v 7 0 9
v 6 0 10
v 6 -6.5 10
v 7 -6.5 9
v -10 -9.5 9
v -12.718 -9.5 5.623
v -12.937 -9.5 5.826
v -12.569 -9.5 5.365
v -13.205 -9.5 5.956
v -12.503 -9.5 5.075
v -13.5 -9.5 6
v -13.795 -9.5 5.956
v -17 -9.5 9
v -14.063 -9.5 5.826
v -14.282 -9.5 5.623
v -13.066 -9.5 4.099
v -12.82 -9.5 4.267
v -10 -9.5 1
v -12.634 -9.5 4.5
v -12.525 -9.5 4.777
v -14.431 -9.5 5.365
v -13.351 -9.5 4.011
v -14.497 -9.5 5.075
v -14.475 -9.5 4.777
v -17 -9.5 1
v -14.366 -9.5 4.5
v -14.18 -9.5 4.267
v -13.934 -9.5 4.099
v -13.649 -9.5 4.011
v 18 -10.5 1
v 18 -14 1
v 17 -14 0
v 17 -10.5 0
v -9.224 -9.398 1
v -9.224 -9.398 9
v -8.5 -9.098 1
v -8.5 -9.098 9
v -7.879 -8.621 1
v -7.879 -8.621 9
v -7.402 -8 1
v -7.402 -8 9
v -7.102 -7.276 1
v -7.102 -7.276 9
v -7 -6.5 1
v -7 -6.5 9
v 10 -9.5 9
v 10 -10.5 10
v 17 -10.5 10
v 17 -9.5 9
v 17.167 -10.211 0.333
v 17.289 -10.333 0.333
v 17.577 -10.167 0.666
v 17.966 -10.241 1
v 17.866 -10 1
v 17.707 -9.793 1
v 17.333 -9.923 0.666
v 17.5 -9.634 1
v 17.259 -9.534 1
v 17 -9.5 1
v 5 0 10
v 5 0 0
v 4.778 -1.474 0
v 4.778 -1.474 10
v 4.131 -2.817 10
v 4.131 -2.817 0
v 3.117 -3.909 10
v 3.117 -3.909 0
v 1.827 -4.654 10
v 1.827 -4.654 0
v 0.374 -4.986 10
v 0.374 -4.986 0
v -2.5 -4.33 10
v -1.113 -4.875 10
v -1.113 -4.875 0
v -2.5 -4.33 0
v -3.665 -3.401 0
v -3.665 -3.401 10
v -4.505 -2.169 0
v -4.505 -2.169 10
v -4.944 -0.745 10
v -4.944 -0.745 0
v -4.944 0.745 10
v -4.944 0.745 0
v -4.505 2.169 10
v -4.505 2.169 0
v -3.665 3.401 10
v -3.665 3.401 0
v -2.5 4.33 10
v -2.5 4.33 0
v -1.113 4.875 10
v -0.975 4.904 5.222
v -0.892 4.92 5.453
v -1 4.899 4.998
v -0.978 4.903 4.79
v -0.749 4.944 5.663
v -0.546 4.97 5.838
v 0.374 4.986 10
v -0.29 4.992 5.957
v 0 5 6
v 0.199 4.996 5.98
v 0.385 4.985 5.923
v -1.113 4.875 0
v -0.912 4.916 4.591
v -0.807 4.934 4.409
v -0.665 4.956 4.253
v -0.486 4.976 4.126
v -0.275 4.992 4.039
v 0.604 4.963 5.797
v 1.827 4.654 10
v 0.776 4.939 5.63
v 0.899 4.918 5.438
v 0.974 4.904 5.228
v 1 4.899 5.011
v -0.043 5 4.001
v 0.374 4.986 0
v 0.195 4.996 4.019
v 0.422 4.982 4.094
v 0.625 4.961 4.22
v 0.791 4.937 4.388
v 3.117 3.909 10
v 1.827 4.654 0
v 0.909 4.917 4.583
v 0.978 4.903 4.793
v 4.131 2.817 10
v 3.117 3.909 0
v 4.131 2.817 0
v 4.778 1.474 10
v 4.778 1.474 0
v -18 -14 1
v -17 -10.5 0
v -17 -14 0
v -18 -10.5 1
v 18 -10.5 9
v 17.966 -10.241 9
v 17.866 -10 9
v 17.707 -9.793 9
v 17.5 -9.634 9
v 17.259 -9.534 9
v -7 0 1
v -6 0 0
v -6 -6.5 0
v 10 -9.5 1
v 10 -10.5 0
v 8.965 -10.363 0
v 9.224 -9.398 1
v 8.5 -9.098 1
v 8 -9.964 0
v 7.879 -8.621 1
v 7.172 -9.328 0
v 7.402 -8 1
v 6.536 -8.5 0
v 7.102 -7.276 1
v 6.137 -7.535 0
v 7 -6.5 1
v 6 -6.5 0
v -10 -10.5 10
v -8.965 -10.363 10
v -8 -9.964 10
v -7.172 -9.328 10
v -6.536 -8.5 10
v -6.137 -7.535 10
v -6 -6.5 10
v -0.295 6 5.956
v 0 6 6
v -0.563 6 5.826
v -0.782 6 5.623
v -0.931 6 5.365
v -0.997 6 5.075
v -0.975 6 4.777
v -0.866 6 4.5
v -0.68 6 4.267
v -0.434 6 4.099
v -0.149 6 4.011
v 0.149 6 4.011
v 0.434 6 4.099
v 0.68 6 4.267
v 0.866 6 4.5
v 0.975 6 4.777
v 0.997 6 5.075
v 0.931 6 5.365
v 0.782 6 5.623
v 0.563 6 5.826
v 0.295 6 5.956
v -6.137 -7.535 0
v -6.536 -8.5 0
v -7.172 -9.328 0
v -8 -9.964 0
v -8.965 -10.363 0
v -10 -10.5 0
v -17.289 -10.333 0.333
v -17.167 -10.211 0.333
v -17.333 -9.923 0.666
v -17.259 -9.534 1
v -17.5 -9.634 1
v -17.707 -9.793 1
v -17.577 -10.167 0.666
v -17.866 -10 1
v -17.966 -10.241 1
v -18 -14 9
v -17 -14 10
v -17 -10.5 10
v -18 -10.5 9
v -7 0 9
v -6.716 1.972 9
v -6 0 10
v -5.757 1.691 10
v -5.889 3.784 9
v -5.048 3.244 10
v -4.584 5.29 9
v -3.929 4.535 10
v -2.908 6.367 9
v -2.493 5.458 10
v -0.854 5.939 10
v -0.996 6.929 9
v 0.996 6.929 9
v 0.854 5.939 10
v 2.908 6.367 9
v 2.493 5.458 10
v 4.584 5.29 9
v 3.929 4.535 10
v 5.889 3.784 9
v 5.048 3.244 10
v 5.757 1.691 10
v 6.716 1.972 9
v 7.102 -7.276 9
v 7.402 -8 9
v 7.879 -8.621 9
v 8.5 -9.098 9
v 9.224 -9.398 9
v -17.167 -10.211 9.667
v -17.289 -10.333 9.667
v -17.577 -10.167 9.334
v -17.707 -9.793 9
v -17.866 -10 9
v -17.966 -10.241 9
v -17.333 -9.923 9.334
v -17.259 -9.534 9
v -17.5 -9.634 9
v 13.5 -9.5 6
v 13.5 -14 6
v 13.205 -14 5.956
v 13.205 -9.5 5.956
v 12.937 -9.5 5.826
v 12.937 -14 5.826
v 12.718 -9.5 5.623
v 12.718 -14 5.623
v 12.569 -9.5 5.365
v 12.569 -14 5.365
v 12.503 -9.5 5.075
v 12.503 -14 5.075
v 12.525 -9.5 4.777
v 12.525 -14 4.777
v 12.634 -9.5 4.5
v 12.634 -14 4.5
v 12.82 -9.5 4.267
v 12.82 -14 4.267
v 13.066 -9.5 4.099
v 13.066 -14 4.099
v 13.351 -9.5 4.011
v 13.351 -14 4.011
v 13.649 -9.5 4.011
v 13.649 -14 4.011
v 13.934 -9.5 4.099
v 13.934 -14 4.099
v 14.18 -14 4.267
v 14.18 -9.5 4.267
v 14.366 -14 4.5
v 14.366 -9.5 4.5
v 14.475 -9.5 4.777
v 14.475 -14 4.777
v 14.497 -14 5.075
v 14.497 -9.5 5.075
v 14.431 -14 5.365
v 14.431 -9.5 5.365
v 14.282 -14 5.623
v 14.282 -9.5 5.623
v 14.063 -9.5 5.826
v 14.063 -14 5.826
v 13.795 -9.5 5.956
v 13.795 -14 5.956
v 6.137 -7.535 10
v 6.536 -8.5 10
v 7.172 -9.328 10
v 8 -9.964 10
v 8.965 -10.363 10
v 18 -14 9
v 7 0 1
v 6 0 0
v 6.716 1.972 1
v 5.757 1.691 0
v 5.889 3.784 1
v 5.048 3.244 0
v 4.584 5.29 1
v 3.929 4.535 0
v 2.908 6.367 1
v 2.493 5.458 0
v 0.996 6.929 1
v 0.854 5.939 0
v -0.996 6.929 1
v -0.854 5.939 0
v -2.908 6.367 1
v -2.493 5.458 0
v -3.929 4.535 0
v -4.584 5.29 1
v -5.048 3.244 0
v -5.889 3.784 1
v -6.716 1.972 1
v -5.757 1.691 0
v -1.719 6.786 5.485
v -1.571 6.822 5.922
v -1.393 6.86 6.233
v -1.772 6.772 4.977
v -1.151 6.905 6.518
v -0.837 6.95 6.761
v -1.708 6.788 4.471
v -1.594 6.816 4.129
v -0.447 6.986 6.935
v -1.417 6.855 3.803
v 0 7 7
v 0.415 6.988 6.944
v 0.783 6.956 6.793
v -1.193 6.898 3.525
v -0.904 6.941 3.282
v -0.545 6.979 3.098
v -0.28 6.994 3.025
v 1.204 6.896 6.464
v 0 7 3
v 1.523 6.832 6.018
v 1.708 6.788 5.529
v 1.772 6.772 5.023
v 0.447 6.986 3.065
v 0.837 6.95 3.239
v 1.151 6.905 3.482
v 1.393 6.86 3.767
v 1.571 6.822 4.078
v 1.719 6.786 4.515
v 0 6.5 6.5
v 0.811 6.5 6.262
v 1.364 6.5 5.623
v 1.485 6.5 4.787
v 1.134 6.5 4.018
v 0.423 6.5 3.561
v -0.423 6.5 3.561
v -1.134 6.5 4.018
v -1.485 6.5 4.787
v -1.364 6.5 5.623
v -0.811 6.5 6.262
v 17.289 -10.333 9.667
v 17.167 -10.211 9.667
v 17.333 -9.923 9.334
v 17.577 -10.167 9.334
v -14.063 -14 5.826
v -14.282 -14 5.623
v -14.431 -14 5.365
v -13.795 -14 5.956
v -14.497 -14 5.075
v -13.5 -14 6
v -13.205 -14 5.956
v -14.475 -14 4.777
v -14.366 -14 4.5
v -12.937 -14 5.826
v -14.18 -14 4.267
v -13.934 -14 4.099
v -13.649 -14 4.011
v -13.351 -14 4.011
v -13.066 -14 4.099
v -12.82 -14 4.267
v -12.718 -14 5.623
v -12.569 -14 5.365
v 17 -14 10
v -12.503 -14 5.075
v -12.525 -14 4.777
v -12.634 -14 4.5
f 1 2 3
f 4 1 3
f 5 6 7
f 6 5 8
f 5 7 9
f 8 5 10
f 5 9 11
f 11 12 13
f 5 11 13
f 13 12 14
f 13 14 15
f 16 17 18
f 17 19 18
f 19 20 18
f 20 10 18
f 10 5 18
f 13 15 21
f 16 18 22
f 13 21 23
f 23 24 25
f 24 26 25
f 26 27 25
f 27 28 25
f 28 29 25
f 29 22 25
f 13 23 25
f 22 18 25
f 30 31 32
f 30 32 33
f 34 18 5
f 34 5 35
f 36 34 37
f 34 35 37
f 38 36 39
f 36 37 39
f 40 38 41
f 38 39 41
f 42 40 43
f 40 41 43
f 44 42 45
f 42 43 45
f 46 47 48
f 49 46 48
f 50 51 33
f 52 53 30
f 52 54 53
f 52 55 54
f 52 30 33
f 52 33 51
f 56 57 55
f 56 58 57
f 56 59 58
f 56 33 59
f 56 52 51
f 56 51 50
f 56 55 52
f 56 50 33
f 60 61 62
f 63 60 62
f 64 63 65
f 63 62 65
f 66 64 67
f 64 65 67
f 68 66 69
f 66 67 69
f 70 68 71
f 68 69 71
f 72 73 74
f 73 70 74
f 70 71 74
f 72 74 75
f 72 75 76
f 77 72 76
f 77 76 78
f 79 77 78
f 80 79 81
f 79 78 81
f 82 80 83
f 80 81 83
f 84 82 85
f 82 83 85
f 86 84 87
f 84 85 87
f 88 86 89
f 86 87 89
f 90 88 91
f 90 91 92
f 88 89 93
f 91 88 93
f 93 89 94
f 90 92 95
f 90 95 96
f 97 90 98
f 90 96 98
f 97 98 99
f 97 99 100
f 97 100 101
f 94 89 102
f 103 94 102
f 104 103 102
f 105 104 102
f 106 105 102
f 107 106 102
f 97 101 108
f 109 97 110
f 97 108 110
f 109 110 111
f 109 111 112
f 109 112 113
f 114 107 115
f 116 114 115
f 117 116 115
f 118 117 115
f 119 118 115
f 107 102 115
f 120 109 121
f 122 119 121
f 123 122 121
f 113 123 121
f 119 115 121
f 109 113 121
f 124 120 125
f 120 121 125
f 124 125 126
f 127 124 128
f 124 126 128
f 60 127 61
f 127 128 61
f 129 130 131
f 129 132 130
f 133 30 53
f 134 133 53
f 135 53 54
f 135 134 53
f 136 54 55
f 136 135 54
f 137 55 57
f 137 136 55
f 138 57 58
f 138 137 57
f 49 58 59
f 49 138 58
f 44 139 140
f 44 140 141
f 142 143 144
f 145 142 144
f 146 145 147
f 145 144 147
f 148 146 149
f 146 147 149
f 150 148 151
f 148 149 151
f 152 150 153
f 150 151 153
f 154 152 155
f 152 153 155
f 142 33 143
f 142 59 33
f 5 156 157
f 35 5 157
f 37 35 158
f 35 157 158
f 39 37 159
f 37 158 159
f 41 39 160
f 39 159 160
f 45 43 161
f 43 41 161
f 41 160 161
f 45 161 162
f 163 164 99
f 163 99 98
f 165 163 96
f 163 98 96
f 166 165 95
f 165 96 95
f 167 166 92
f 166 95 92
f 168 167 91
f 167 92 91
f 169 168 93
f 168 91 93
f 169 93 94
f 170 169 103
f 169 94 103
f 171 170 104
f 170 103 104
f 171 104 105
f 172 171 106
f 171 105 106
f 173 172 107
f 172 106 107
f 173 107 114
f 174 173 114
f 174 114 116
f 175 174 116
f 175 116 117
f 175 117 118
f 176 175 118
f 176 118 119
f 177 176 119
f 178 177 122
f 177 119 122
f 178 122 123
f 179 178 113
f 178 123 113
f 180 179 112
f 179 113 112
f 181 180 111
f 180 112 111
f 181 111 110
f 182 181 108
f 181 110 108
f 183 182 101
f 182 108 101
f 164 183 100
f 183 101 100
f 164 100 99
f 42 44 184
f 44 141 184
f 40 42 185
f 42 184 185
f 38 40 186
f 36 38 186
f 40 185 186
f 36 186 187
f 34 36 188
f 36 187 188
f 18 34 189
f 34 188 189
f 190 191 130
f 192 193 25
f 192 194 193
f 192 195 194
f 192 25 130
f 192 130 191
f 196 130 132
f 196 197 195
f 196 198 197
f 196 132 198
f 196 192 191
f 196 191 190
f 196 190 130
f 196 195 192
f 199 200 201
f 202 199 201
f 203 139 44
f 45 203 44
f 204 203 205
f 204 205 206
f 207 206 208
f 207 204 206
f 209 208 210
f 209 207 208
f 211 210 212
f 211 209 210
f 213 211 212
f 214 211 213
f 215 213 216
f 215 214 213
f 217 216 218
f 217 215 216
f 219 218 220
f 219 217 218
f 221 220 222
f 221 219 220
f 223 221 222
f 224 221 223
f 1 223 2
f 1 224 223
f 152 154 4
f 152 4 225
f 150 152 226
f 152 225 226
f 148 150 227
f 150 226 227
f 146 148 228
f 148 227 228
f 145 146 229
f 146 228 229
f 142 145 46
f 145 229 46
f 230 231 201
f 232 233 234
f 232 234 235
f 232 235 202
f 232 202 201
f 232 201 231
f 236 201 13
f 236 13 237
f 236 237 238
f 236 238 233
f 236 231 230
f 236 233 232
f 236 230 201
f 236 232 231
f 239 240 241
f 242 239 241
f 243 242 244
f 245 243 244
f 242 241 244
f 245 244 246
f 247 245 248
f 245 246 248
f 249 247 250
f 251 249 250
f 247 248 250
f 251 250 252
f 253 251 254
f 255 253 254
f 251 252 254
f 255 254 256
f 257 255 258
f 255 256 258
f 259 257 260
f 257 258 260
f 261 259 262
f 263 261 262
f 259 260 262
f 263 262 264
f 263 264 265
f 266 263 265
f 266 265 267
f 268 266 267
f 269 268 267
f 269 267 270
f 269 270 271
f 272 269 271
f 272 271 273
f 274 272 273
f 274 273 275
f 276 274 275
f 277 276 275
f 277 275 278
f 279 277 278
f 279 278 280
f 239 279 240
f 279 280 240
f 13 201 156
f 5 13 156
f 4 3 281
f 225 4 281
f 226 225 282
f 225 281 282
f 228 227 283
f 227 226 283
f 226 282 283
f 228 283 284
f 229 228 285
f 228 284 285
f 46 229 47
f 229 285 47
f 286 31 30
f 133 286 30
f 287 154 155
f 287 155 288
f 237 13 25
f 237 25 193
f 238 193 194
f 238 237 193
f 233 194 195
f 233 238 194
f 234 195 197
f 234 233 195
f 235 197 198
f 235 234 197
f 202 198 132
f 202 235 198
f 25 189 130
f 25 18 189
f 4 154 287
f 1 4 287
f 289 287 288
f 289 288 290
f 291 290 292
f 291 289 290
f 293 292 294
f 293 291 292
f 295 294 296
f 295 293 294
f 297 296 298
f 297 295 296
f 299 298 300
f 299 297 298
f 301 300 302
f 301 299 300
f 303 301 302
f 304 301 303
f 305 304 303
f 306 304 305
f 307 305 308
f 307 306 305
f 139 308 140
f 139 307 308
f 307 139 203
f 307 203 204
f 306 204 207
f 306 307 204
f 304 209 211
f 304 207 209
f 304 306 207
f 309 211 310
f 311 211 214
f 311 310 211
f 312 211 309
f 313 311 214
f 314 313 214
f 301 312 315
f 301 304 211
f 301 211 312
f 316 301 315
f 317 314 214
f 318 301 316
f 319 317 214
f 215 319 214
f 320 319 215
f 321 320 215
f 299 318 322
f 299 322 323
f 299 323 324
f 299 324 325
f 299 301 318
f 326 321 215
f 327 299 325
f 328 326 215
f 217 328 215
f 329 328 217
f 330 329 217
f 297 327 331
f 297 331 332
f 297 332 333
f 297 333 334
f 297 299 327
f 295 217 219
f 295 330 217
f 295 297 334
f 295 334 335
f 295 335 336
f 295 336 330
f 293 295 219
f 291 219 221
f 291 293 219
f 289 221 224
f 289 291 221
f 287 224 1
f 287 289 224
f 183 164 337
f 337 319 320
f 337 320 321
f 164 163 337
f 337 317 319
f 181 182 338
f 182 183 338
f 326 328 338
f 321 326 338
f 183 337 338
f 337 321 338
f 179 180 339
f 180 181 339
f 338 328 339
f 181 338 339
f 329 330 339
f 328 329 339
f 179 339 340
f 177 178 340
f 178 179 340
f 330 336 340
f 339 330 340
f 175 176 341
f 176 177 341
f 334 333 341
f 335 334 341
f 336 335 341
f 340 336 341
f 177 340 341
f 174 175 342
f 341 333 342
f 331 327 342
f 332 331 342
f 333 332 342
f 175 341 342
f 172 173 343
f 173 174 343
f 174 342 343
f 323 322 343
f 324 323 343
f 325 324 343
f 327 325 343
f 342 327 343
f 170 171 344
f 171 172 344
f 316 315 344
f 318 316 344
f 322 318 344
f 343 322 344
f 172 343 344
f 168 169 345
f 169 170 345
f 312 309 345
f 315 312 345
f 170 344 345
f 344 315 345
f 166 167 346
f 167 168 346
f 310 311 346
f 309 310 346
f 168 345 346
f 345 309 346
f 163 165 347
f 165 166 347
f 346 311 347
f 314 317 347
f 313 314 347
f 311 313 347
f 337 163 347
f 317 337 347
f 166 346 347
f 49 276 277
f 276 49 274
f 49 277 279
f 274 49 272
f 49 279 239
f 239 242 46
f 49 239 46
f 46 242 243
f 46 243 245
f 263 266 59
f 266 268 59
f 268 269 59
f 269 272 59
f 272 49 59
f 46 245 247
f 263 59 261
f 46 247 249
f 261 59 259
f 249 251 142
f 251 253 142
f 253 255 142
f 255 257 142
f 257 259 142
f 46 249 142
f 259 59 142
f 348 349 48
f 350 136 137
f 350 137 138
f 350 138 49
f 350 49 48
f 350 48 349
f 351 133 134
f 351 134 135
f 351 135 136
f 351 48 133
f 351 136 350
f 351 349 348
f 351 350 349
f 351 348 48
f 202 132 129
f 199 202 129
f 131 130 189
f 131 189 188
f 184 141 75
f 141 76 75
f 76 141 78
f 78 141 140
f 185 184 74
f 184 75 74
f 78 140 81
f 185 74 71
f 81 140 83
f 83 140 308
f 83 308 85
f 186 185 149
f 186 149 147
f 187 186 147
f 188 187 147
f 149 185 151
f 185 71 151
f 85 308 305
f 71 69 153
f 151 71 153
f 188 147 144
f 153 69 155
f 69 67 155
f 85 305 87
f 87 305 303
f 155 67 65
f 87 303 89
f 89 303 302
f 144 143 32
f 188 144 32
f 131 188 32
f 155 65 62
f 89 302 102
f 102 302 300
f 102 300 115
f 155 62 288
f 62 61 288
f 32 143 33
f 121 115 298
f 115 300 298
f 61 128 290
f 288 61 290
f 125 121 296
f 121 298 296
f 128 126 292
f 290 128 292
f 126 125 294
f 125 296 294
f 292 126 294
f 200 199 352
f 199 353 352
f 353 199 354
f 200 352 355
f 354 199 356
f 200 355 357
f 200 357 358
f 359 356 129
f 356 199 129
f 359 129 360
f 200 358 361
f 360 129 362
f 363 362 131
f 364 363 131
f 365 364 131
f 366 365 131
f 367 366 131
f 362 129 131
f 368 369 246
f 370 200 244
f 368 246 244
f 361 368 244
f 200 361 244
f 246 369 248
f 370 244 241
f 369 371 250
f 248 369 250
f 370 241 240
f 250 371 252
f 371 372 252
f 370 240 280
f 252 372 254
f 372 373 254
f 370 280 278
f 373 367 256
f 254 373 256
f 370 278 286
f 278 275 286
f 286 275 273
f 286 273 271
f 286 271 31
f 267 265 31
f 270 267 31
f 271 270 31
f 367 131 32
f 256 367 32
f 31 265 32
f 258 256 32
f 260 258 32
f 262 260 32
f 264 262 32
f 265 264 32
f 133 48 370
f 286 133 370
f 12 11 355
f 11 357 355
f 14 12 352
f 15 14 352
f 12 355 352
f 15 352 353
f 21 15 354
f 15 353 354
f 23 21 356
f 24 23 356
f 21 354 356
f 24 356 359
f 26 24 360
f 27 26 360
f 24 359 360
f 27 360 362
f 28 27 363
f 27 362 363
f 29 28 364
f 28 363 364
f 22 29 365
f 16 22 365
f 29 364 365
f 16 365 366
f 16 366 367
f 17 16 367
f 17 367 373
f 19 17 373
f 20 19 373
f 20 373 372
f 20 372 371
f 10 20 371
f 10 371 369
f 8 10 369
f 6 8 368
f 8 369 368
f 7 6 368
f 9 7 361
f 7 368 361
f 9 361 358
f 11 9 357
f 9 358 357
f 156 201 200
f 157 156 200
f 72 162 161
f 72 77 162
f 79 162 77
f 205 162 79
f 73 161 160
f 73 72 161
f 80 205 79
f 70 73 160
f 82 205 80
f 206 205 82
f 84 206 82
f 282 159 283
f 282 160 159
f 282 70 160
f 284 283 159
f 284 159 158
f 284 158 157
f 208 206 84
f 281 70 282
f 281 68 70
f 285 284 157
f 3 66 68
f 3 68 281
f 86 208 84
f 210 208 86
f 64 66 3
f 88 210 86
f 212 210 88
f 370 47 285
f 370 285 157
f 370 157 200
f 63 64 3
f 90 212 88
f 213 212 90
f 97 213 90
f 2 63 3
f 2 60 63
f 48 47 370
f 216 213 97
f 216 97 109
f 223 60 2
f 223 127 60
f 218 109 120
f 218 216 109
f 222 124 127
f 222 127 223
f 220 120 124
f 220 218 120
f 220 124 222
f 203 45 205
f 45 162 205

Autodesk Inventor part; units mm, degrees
ref_plane "YZ Plane" through (0, 0, 0) normal (1, 0, 0) x (0, 1, 0)
ref_plane "XY Plane" through (0, 0, 0) normal (0, 0, 1) x (1, 0, 0)
sketch "Sketch1" plane through (0, 0, 0) normal (0, 0, 1) x (1, 0, 0)
  circle A0 centre (0, 0) radius 5
  circle A1 centre (0, 0) radius 7
  line L0 (-18, -9.5) -> (-10, -9.5)
  line L1 (18, -9.5) -> (10, -9.5)
  line L2 (0, -14) -> (18, -14)
  line L3 (0, -14) -> (-18, -14)
  line L4 (-7, 0) -> (-7, -9.5)
  line L5 (-7, -9.5) -> (-18, -9.5)
  line L6 (-18, -9.5) -> (-18, -14)
  line L7 (-18, -14) -> (18, -14)
  line L8 (18, -14) -> (18, -9.5)
  line L9 (18, -9.5) -> (7, -9.5)
  line L10 (7, -9.5) -> (7, 0)
  point P0 (-10.8595, -8.0551)
  dimension "d0" = 14
  dimension "d1" = 10
  dimension "d2" = 4.5
  dimension "d3" = 0
  dimension "d4" = 11
  dimension "d5" = 36
  dimension "d6" = 9.5
  dimension "d7" = 8
  dimension "d8" = 18
  dimension "d9" = 28
  dimension "d10" = 1.4449
  dimension "d11" = 28.8595
extrude "Extrusion1" add sketch "Sketch1" along normal blind 10
fillet "Fillet1" radius 1 2 edges at (18, -9.5, 5) (-18, -9.5, 5)
fillet "Fillet2" radius 3 2 edges at (7, -9.5, 5) (-7, -9.5, 5)
chamfer "Chamfer1" distance 1 angle 45 22 edges at (0, 7, 10) (-7, -3.2502, 10) (-9.9998, -9.5, 10) (-13.5, -9.5, 10) (-17.7071, -9.7929, 10) (-18, -12.25, 10) (7, -3.2503, 10) (9.9997, -9.5, 10) (13.5, -9.5, 10) (17.7071, -9.7929, 10) (18, -12.25, 10) (0, 7, 0) (-7, -3.2502, 0) (-9.9998, -9.5, 0) (-13.5, -9.5, 0) (-17.7071, -9.7929, 0) (-18, -12.25, 0) (7, -3.2503, 0) (9.9997, -9.5, 0) (13.5, -9.5, 0) (17.7071, -9.7929, 0) (18, -12.25, 0)
sketch "Sketch2" plane through (10, -9.5, 1) normal (0, 1, 0) x (1, 0, 0)
  line L0 (-27, 0) -> (-20, 0) projected
  line L1 (-27, -8) -> (-27, 0) projected
  line L2 (-20, -8) -> (-27, -8) projected
  line L3 (-20, 0) -> (-20, -8) projected
  line L4 (0, 0) -> (7, 0) projected
  line L5 (0, -8) -> (0, 0) projected
  line L6 (7, -8) -> (0, -8) projected
  line L7 (7, 0) -> (7, -8) projected
  line L8 (-27, -8) -> (-20, -8)
  line L9 (-20, -8) -> (-20, 0)
  line L10 (-20, 0) -> (-27, 0)
  line L11 (-27, 0) -> (-27, -8)
  line L12 (-27, -8) -> (-20, 0) construction
  line L13 (-20, -8) -> (-27, 0) construction
  line L14 (0, -8) -> (7, -8)
  line L15 (7, -8) -> (7, 0)
  line L16 (7, 0) -> (0, 0)
  line L17 (0, 0) -> (0, -8)
  line L18 (0, -8) -> (7, 0) construction
  line L19 (7, -8) -> (0, 0) construction
  point P0 (-10, 1)
  point P1 (-23.5, -4)
  point P2 (3.5, -4)
  point P3 (-23.5, -4)
  point P4 (3.5, -4)
hole "Hole1" at (-13.5, -9.5, 5) at (13.5, -9.5, 5) direction (0, -1, 0) diameter 2 end through all
ref_plane "Work Plane1" through (0, 7, 0) normal (0, 1, 0) x (-1, 0, 0)
sketch "Sketch3" plane through (0, 7, 0) normal (0, 1, 0) x (-1, 0, 0)
  line L0 (7, 1) -> (-7, 1) projected
  line L1 (7, 1) -> (7, 9) projected
  line L2 (-7, 9) -> (7, 9) projected
  line L3 (-7, 1) -> (-7, 9) projected
  line L4 (7, 9) -> (-7, 9)
  line L5 (-7, 9) -> (-7, 1)
  line L6 (-7, 1) -> (7, 1)
  line L7 (7, 1) -> (7, 9)
  line L8 (7, 9) -> (-7, 1) construction
  line L9 (-7, 9) -> (7, 1) construction
  point P0 (0, 0)
  point P1 (0, 5)
  point P2 (0, 5)
hole "Hole2" at (0, 7, 5) direction (0, -1, 0) diameter 2 depth 8 tip angle 118 countersink diameter 4 countersink angle 90
properties part number "pt2"
